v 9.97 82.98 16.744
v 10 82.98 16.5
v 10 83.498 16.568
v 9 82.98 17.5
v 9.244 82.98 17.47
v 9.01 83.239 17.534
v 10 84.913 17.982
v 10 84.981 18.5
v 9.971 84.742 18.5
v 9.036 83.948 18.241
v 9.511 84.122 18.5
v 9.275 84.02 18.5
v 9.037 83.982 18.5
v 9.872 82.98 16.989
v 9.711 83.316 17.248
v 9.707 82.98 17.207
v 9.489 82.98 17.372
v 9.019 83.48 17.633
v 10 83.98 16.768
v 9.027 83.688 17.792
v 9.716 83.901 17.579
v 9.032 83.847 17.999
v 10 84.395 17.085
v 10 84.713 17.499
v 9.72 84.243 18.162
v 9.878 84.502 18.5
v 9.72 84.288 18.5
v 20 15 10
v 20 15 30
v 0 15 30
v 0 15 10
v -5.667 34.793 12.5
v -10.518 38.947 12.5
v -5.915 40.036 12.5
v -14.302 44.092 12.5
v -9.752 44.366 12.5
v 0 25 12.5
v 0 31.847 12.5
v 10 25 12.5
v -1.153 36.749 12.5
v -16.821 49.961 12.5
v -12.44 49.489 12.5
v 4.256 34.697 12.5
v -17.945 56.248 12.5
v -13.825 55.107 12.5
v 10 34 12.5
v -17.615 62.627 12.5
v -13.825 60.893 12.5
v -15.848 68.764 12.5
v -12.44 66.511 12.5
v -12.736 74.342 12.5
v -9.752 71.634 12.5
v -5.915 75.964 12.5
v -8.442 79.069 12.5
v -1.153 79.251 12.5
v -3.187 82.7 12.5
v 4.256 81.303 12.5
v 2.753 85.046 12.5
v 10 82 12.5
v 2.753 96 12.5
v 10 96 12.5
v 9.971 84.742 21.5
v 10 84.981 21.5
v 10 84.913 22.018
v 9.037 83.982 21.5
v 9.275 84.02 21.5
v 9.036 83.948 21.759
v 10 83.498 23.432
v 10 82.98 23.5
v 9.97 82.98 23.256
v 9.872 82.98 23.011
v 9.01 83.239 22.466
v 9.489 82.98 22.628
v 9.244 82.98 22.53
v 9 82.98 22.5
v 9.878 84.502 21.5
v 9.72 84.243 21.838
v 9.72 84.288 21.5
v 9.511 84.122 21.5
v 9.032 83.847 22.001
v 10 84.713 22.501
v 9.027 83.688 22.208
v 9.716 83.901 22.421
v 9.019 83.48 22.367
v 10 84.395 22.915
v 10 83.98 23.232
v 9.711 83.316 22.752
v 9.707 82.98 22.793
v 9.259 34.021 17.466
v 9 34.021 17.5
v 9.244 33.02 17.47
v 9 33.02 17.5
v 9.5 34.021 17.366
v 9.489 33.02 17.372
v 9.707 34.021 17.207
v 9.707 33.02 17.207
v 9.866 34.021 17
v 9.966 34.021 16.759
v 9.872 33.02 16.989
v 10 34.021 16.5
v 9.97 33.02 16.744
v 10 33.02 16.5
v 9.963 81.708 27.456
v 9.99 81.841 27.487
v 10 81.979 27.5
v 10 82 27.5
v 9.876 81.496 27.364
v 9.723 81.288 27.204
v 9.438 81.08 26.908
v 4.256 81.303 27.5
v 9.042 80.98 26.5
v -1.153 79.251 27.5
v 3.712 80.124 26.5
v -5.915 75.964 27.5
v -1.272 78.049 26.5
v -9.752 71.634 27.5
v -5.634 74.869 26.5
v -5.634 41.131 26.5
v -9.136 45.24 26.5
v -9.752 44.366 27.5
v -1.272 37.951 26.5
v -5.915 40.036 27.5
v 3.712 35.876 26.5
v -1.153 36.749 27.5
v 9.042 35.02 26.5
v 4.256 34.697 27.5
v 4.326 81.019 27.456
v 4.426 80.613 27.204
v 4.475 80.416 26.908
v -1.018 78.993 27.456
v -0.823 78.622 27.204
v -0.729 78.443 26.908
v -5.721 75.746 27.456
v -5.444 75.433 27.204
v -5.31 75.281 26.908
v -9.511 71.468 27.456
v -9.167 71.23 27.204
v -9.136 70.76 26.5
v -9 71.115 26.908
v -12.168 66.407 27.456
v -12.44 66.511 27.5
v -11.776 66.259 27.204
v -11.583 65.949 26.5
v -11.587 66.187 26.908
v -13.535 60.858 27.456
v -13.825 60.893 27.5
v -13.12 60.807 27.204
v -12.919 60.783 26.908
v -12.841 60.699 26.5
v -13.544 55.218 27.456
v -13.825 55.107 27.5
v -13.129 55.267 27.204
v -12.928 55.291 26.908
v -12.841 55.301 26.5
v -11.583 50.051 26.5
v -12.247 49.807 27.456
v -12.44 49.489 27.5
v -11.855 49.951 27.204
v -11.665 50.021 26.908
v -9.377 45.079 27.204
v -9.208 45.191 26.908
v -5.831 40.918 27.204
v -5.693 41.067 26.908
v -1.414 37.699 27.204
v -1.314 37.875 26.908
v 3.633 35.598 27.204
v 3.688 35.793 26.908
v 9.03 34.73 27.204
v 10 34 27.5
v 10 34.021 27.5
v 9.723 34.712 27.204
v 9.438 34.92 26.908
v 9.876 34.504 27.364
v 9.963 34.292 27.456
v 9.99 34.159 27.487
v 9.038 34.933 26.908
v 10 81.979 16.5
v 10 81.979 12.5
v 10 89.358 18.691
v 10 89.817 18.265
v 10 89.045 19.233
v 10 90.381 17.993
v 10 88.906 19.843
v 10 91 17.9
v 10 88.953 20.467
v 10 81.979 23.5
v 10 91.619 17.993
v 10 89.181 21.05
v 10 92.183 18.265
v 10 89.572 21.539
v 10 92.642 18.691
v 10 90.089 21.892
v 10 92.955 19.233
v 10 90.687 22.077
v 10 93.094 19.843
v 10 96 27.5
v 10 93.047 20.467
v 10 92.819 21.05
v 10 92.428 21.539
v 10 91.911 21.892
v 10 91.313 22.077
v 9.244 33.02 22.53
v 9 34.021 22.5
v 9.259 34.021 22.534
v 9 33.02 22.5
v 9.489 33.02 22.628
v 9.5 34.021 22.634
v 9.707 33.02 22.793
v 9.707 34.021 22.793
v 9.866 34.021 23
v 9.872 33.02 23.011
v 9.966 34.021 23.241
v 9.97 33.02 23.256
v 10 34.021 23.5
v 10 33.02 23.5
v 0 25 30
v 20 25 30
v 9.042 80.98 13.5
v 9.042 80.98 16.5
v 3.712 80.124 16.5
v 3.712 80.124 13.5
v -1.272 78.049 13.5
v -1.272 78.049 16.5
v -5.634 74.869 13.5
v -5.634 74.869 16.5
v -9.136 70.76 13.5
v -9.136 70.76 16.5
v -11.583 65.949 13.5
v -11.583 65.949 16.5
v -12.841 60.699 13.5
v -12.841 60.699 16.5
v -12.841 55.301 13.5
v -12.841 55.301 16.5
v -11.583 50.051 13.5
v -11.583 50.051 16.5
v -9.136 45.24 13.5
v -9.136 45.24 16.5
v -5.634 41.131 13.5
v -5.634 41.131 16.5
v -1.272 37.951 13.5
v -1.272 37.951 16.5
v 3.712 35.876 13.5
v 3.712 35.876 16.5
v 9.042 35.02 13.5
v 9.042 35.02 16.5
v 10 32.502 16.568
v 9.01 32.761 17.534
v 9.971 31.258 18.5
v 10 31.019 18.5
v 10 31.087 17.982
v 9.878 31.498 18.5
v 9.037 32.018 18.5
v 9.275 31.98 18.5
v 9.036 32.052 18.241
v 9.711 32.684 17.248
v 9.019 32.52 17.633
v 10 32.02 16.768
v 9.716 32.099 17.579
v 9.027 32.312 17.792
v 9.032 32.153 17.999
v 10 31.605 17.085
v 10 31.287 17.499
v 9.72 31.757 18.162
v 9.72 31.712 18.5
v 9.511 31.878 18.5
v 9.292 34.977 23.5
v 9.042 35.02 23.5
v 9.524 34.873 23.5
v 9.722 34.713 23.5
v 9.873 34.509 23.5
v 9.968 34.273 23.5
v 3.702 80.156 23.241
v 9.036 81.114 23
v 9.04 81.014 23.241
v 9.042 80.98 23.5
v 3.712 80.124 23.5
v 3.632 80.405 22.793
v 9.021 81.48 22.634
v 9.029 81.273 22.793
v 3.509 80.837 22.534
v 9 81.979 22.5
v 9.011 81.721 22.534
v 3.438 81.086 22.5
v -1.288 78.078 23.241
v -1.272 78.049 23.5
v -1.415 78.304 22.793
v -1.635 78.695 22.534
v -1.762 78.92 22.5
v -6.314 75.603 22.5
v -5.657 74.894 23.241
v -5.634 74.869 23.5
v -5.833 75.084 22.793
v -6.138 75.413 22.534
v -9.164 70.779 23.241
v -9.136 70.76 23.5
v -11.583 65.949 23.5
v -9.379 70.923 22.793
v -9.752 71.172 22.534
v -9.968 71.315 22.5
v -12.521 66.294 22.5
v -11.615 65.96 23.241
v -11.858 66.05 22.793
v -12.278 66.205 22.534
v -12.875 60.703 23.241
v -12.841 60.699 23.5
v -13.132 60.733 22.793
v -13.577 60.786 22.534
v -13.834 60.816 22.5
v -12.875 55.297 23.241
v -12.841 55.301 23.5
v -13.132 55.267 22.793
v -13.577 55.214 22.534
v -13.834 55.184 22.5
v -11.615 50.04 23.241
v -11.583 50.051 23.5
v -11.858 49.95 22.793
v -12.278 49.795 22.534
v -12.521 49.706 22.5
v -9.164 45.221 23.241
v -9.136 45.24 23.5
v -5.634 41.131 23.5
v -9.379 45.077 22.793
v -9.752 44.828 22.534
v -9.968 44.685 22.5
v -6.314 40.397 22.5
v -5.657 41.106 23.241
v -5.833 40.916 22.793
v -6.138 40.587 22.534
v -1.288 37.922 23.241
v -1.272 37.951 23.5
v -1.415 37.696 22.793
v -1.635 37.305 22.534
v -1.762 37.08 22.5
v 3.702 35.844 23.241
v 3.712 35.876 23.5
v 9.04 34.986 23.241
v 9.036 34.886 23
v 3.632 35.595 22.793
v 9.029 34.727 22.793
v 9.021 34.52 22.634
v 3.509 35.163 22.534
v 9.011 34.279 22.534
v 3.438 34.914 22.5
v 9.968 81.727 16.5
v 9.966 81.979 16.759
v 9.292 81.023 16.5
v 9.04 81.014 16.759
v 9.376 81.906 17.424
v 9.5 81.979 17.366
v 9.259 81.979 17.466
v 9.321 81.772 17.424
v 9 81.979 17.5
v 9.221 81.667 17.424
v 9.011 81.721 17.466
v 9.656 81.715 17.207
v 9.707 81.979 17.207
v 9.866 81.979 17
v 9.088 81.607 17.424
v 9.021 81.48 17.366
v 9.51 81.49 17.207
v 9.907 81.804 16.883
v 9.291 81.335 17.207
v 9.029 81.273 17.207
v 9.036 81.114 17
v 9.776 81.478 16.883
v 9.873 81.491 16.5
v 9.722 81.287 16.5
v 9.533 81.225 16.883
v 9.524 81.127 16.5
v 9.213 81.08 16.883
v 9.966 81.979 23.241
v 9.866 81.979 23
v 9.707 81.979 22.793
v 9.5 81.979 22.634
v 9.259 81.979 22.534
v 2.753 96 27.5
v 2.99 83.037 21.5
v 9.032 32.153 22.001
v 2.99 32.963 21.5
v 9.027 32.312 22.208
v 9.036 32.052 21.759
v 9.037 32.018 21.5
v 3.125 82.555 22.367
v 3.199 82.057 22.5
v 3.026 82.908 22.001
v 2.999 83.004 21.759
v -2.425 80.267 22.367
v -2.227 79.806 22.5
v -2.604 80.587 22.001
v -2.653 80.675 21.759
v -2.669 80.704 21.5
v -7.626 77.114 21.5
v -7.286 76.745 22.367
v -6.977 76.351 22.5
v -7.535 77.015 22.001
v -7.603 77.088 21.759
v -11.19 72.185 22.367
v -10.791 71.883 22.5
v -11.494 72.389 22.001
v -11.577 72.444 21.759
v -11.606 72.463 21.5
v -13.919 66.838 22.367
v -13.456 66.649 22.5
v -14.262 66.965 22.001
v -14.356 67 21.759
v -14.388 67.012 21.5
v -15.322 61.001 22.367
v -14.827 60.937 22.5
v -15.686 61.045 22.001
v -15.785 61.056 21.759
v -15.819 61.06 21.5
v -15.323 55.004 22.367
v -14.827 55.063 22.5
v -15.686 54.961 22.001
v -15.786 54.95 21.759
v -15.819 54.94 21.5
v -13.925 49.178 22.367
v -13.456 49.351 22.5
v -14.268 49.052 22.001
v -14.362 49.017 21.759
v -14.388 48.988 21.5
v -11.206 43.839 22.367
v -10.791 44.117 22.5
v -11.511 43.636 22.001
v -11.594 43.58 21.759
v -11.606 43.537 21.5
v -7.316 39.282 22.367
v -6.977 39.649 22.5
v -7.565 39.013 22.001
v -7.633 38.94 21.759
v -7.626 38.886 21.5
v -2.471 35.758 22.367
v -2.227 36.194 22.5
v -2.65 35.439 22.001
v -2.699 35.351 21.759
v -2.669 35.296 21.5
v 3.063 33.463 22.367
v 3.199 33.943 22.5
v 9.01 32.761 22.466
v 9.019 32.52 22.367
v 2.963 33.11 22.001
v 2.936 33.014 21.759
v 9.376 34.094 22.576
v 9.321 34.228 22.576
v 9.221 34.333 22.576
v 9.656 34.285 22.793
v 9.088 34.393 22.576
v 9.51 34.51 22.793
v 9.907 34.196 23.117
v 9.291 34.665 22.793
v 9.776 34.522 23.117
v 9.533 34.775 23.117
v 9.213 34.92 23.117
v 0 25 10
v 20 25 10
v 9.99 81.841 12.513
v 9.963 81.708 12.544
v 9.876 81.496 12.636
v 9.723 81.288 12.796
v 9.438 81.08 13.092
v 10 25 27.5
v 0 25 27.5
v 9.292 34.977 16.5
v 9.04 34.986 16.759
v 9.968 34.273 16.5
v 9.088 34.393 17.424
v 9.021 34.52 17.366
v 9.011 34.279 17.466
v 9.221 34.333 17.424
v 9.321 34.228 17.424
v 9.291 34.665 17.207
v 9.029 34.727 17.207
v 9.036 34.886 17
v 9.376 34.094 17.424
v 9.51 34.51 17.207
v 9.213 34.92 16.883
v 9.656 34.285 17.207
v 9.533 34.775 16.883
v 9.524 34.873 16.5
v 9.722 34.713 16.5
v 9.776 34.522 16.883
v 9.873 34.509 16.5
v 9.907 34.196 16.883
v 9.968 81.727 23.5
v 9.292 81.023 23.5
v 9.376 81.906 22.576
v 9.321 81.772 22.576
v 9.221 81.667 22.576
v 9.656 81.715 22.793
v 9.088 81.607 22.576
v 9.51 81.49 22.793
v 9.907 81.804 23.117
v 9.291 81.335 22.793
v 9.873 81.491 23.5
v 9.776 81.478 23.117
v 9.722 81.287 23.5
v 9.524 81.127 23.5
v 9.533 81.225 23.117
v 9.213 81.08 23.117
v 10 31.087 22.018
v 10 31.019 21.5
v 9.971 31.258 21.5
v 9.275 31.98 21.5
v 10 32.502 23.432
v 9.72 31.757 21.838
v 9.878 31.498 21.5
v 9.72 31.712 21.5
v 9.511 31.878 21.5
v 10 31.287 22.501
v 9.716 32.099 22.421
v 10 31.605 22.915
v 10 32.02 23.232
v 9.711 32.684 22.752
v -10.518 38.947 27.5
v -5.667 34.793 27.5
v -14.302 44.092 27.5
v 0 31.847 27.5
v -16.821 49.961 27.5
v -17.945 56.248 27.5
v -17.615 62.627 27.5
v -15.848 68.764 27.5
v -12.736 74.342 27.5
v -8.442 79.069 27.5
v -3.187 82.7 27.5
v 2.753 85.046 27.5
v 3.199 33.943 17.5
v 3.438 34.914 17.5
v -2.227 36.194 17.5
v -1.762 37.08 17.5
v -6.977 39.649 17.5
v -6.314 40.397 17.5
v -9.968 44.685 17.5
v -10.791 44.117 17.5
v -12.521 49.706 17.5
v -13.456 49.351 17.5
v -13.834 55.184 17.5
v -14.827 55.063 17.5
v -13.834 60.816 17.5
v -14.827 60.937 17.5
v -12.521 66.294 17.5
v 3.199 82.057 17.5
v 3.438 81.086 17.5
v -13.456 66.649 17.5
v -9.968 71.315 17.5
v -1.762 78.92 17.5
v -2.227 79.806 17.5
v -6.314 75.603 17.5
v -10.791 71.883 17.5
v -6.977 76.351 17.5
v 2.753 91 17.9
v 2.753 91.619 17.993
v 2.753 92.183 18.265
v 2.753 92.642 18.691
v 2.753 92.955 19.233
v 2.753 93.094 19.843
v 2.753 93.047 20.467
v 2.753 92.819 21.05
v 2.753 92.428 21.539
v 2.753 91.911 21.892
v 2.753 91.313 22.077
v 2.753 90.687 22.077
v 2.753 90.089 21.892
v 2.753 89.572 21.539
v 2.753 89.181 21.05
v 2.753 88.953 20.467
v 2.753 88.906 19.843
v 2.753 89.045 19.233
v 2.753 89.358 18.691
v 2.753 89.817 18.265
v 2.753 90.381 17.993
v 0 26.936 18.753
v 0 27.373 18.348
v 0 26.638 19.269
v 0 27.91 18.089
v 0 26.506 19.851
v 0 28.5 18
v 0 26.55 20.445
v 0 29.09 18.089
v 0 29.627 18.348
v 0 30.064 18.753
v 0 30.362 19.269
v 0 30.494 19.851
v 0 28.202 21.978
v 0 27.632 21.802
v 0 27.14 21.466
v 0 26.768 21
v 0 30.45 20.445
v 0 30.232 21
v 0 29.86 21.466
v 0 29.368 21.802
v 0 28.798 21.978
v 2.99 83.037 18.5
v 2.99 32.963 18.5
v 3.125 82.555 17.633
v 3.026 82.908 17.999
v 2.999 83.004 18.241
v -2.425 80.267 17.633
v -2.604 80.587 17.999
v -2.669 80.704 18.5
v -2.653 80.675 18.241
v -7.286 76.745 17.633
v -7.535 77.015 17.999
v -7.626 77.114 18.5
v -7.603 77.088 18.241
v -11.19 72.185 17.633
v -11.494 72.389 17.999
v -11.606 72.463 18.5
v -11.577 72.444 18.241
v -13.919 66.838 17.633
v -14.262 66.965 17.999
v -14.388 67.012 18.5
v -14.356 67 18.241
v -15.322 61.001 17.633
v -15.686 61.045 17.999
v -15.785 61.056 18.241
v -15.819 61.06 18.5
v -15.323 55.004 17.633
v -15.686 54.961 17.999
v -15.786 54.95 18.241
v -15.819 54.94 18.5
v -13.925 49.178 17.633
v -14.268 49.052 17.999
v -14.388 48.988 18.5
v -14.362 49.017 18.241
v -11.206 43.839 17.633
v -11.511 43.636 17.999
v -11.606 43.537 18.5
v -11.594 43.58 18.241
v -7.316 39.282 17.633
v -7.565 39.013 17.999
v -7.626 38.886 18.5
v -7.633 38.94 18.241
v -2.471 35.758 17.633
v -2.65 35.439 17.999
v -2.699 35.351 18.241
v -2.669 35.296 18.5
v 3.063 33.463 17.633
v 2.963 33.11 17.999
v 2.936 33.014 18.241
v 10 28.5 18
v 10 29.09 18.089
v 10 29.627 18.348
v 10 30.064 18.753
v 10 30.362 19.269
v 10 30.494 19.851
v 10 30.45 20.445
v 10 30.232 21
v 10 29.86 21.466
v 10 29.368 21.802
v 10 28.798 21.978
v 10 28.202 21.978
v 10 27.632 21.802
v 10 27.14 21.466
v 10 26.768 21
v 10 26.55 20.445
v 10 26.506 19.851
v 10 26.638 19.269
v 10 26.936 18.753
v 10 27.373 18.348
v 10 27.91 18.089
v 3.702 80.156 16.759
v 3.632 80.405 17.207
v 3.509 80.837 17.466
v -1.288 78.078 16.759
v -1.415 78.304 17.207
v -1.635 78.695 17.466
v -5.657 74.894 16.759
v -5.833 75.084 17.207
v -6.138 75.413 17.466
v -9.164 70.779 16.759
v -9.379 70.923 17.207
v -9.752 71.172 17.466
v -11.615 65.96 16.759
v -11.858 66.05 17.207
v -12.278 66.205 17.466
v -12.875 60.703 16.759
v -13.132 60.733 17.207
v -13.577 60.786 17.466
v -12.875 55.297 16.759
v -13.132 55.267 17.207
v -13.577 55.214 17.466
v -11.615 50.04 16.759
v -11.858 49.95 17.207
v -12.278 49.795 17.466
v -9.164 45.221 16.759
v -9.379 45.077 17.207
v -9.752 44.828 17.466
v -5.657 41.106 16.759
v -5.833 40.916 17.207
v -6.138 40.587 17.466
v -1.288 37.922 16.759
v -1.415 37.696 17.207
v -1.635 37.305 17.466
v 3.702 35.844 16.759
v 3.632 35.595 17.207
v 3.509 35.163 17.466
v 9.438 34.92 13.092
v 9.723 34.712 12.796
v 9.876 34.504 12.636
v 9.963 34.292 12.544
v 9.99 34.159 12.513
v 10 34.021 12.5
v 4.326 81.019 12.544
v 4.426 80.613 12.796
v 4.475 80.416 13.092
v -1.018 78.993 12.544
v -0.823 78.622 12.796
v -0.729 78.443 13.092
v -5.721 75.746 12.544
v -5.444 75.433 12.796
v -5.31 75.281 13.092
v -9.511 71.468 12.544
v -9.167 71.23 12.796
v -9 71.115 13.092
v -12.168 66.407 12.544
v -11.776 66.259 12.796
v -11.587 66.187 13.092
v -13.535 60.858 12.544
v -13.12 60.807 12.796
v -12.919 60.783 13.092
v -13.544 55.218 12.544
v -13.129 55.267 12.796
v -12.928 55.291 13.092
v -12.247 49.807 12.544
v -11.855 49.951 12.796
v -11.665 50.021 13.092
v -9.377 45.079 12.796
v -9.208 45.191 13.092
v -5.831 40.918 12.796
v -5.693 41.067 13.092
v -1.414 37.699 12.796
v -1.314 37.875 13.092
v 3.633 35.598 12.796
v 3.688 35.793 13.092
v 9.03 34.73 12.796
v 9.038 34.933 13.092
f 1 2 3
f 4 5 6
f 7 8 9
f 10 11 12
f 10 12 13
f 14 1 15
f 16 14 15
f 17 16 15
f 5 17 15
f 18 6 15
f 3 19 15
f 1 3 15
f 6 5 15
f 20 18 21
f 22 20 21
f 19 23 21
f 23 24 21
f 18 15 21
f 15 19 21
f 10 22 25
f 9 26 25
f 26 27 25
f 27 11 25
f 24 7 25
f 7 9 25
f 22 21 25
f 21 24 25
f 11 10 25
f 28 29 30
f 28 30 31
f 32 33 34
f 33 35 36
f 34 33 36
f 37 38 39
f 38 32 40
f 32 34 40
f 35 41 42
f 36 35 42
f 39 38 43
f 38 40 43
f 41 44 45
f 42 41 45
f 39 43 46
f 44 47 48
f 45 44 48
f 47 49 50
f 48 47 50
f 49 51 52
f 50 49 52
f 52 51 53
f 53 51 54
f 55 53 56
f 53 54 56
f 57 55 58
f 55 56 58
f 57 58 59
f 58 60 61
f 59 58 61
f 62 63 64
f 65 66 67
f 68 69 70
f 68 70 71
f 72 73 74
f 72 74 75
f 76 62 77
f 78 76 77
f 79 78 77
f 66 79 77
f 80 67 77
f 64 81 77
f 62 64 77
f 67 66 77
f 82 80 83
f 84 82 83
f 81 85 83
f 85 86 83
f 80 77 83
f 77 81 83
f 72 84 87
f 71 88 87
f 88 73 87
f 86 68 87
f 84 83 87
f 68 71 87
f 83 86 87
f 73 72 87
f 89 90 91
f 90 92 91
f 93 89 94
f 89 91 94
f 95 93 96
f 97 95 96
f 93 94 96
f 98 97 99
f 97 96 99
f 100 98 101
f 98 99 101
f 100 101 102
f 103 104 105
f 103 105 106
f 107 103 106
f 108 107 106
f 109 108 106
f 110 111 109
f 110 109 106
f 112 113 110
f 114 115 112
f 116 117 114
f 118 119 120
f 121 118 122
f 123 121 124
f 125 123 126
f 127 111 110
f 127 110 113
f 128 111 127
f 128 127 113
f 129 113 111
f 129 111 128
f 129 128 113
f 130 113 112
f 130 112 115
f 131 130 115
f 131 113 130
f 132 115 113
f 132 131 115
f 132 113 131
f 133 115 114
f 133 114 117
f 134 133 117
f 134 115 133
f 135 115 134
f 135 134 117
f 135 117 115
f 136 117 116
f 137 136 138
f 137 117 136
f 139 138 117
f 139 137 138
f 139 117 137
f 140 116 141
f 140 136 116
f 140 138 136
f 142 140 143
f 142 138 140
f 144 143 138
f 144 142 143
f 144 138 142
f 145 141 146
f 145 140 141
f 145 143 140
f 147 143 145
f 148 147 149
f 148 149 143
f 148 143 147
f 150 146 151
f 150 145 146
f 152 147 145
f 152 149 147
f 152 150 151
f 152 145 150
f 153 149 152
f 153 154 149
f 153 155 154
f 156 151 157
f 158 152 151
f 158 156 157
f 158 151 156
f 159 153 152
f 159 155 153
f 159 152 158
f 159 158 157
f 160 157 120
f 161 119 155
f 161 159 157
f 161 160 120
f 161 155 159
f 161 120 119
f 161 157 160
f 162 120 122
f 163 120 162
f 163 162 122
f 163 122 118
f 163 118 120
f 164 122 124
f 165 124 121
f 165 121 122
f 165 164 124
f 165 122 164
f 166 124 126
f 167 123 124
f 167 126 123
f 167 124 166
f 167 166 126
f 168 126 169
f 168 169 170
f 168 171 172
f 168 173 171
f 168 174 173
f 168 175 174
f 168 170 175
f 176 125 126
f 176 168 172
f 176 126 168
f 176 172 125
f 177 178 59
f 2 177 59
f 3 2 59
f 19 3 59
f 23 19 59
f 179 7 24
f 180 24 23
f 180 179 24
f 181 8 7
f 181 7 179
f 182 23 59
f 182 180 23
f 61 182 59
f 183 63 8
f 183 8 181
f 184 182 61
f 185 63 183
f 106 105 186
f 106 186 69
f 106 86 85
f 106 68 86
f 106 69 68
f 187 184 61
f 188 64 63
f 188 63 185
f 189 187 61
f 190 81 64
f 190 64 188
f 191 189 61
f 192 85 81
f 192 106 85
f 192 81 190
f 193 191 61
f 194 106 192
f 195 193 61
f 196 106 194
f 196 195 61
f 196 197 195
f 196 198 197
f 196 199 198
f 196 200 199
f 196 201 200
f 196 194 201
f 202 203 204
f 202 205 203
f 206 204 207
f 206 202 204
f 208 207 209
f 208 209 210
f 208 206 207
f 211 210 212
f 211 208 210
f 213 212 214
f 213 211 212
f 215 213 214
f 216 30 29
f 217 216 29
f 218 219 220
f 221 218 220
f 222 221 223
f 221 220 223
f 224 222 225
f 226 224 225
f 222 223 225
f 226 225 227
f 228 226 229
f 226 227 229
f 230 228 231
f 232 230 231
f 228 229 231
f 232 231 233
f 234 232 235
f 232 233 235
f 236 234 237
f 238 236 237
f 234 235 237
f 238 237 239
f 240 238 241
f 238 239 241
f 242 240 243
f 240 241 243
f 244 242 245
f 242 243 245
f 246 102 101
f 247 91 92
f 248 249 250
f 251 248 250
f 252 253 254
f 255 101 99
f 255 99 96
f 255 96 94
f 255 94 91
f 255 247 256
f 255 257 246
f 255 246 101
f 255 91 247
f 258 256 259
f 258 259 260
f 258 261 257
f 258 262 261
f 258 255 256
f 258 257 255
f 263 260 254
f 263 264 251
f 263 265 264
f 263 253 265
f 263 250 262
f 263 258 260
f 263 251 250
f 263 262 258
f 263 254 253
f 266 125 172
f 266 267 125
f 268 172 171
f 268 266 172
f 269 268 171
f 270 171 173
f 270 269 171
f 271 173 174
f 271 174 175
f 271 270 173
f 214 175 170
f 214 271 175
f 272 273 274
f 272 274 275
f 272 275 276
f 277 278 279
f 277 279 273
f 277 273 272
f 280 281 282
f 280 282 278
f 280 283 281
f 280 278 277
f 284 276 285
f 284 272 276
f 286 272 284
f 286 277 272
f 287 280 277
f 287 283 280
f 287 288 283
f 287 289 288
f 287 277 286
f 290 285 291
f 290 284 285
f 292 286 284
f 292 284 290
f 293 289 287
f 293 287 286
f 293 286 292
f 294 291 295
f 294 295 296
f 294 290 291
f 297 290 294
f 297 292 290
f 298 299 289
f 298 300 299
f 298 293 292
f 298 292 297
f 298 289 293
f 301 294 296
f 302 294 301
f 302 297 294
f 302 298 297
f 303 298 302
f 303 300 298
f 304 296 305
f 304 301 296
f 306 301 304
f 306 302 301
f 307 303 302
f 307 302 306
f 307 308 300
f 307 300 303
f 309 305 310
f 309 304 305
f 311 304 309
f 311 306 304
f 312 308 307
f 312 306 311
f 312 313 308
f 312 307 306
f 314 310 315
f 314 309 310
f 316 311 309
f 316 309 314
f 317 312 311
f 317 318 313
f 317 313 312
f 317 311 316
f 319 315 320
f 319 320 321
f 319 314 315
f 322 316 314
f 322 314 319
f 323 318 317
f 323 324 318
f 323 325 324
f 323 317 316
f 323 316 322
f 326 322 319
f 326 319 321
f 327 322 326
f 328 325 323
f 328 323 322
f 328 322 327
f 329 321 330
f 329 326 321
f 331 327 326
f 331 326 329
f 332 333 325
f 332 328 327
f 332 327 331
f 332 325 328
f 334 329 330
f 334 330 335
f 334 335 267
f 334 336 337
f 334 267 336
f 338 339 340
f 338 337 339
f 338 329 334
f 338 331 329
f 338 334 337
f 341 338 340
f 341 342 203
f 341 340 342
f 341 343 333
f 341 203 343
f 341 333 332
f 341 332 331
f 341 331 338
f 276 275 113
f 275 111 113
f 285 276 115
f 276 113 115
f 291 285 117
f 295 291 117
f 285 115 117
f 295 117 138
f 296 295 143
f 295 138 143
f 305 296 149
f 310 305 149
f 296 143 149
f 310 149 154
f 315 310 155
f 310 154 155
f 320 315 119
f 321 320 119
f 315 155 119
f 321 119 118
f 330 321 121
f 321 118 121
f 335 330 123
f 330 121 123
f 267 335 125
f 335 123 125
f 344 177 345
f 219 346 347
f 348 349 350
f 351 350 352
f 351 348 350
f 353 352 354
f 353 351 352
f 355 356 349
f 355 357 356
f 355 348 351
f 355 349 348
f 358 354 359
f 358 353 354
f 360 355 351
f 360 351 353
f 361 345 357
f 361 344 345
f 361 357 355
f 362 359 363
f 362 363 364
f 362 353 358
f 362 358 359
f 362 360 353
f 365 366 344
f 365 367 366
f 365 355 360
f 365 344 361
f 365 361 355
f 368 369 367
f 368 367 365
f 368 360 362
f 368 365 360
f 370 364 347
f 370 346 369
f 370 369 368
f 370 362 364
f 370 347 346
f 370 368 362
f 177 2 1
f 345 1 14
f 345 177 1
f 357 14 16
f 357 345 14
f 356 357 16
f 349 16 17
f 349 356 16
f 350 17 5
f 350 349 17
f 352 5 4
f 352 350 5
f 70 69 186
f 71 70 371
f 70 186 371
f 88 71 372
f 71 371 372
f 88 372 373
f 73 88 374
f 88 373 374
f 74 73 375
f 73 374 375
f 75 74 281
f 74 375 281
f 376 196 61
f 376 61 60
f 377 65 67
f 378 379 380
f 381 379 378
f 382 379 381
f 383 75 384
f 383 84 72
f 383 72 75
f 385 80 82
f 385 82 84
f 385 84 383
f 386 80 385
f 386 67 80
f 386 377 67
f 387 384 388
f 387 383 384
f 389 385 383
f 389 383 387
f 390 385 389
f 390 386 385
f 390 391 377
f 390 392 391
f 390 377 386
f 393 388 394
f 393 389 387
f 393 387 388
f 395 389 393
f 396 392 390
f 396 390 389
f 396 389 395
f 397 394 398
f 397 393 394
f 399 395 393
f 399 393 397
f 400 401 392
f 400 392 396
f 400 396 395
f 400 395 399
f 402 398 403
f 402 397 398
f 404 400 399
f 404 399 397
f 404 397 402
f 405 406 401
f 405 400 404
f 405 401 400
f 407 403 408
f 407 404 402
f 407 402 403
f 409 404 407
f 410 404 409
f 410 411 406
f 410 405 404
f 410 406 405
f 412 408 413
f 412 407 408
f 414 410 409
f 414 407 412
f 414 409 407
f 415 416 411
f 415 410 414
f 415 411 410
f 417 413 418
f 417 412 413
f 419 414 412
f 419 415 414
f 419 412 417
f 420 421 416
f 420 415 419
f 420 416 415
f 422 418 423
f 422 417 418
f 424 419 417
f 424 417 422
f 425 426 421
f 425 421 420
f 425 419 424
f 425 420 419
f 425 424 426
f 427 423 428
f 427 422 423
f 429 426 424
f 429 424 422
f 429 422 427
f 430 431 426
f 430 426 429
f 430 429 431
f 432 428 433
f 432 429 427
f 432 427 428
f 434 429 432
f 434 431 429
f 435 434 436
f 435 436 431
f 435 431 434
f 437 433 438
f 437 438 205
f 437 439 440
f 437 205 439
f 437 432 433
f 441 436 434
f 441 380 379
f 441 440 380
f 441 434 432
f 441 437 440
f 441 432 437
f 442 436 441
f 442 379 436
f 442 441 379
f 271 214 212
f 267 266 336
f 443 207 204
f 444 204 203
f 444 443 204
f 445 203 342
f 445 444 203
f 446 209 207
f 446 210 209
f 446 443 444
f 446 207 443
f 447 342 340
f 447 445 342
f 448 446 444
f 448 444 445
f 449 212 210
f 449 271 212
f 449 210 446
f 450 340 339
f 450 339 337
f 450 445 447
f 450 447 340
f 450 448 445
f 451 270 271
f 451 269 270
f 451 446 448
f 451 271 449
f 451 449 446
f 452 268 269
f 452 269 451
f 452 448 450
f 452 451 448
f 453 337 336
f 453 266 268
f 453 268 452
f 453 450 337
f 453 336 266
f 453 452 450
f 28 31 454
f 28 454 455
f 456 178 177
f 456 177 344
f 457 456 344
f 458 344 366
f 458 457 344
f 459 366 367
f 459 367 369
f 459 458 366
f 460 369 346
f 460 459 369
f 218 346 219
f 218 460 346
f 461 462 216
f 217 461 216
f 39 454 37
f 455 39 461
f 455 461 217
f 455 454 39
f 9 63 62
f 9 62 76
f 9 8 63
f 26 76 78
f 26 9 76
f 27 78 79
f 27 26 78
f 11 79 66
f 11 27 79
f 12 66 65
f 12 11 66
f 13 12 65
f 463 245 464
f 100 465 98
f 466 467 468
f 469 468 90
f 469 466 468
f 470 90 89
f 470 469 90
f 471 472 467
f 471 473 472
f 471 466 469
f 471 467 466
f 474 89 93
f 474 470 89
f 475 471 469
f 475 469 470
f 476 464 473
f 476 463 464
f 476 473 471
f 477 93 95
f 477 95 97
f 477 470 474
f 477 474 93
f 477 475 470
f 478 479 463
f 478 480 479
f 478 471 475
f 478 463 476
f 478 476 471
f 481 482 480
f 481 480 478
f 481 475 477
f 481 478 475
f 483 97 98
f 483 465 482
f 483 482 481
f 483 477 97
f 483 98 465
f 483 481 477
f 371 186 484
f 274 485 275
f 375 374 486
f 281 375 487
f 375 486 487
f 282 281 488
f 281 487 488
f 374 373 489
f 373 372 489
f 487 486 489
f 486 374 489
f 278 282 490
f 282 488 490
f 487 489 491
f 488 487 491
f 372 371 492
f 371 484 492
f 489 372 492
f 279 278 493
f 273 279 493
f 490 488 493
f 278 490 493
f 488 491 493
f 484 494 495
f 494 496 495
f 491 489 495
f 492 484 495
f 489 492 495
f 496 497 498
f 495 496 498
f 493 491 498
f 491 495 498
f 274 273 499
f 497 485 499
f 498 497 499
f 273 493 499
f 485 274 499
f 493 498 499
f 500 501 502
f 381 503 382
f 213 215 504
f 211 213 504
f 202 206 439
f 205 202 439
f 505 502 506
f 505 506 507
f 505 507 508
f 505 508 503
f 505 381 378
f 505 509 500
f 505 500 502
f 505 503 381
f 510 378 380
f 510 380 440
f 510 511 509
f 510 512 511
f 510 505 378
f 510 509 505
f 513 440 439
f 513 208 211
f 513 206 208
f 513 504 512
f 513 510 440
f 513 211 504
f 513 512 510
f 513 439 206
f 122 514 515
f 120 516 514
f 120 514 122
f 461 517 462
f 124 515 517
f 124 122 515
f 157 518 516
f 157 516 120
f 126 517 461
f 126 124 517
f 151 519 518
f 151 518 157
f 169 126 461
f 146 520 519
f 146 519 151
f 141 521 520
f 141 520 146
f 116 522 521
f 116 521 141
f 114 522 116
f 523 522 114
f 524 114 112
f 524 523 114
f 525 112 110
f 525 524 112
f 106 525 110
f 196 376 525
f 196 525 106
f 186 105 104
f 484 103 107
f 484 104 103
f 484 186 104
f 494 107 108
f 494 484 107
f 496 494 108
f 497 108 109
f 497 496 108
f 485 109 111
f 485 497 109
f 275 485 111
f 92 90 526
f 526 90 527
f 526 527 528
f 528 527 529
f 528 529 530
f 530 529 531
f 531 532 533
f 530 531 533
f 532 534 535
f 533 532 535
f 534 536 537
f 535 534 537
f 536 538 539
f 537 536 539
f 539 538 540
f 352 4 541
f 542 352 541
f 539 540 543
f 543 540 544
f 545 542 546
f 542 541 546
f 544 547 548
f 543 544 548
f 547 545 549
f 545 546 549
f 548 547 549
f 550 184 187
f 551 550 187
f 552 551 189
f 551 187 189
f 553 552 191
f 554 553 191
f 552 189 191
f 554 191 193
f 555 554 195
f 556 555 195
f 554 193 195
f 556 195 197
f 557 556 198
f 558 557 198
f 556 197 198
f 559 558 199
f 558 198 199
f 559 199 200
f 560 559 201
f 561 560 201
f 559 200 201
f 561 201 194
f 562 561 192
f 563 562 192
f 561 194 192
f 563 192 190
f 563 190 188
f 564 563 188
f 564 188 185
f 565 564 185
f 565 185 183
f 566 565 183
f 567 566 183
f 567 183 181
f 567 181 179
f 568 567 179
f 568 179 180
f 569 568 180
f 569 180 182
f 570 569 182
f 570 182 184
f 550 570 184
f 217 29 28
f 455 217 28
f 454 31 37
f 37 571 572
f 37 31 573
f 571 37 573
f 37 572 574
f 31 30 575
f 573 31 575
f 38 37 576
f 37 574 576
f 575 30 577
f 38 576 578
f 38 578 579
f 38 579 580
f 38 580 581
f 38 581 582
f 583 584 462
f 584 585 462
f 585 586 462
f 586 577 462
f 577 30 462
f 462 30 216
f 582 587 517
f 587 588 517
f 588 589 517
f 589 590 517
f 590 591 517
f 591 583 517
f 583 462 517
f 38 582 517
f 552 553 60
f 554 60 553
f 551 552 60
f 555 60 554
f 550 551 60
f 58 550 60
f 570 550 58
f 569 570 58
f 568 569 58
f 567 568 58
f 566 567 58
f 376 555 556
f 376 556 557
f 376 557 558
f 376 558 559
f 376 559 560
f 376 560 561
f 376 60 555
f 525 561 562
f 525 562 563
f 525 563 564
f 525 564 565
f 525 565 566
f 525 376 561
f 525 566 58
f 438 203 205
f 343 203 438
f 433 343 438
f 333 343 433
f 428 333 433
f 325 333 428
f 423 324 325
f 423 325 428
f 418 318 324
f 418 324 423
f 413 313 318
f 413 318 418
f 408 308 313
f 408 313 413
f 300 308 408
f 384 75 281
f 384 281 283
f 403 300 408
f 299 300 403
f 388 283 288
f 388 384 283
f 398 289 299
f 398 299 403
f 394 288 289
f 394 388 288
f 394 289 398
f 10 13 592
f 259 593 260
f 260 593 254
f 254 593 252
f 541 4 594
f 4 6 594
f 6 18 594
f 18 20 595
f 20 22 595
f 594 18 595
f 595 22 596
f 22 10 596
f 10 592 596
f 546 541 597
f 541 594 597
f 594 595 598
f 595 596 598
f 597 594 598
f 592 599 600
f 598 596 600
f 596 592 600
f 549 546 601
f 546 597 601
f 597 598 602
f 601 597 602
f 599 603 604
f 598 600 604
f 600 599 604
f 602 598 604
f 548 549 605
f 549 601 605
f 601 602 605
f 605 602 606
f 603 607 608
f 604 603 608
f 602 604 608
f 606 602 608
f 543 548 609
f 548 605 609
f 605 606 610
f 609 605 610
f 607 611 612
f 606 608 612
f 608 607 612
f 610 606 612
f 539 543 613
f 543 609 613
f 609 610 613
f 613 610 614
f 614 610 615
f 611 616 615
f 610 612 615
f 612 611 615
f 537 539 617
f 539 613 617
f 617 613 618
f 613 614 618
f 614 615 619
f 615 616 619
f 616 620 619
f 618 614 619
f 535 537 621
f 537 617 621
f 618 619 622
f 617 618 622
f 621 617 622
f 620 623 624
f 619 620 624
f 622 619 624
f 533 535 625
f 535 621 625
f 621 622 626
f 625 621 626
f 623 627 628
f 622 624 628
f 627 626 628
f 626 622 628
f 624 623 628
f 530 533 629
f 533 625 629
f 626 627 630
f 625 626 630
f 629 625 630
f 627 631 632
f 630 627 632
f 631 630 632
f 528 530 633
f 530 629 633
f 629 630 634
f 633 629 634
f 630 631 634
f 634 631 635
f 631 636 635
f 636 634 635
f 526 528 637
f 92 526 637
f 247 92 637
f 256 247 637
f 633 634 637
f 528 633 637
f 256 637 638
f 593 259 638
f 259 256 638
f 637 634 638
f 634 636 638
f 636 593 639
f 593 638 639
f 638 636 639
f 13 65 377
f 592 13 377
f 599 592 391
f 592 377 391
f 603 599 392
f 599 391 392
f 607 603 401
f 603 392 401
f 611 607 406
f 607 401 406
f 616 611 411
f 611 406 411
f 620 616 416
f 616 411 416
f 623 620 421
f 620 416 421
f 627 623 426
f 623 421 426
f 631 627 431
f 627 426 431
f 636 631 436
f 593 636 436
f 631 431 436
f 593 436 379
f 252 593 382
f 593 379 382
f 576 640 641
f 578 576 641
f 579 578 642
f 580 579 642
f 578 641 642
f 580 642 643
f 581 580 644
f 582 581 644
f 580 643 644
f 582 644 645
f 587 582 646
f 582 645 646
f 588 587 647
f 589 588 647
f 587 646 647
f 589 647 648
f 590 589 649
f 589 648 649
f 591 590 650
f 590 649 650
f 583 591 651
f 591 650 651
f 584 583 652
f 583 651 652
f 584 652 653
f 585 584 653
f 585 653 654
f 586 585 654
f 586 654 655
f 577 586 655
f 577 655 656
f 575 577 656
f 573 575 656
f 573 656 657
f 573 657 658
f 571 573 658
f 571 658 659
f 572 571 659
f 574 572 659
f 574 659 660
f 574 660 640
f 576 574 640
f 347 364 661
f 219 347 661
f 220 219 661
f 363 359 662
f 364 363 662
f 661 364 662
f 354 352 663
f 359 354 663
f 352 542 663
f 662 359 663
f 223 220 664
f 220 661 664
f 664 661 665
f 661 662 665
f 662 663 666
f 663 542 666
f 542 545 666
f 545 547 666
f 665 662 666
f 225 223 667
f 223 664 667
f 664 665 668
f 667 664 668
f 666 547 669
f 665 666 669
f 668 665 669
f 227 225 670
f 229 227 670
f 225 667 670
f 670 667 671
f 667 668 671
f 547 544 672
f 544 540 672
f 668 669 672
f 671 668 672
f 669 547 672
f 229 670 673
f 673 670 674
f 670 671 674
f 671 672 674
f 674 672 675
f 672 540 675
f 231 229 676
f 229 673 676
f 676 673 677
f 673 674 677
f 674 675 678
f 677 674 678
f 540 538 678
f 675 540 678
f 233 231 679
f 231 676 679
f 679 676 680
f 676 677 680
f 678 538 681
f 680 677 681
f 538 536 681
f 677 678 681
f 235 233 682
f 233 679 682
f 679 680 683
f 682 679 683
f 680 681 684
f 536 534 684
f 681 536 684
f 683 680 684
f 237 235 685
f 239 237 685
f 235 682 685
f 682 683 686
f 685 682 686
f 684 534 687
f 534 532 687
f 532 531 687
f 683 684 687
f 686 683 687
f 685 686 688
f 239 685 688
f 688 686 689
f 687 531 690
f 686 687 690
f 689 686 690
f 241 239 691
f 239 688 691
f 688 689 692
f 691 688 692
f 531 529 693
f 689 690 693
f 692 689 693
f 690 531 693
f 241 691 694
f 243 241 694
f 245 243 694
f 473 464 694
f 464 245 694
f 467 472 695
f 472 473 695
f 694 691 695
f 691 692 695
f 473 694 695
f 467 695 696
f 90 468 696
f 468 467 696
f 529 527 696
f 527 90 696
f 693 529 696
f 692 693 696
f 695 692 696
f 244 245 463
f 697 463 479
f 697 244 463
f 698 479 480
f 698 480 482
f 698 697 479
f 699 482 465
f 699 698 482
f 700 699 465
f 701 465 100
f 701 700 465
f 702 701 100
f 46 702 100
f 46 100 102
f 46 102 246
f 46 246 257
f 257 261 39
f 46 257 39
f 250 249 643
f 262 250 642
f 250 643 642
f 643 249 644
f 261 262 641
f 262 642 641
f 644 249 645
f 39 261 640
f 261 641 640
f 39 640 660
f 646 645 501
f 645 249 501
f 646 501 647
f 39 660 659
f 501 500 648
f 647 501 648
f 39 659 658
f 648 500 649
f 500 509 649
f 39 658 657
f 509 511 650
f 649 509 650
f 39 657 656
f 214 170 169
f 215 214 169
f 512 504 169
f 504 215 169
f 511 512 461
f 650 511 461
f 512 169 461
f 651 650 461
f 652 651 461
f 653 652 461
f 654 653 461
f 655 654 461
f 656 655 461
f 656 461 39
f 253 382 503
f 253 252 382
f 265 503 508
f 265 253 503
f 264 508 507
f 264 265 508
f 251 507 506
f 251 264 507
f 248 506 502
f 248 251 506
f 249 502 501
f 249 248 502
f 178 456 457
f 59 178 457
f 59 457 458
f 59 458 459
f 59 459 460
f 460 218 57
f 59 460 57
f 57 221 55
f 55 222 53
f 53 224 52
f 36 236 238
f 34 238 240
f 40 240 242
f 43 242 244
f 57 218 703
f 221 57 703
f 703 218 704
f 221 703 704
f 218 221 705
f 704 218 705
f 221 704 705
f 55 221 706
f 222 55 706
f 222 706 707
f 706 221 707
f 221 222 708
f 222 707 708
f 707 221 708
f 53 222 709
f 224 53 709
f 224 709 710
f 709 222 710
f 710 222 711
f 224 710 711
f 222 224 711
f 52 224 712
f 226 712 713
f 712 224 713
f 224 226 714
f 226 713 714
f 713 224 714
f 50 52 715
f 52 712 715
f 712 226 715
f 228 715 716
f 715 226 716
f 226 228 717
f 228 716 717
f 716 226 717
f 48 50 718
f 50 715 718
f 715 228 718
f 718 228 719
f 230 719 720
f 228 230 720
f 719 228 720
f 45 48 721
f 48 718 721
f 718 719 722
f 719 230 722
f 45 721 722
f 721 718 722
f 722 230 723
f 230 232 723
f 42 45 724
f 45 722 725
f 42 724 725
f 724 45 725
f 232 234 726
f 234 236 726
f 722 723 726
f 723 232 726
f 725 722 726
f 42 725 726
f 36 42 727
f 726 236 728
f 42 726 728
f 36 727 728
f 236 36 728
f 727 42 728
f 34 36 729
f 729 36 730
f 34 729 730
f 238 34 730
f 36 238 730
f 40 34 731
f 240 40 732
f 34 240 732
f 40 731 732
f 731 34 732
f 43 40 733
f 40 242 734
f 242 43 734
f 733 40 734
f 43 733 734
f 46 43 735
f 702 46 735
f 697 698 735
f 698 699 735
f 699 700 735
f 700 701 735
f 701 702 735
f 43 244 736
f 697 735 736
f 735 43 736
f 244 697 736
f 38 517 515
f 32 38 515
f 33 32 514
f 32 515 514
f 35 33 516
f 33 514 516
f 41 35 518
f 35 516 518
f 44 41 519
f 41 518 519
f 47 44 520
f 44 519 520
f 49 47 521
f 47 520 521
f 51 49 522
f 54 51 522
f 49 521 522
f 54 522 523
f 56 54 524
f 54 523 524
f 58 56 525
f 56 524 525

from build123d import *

# Parameters (mm, degrees)
SKETCH1_W           = 20
SKETCH1_H           = 40
BOSS_EXTRUDE1_DEPTH = 15
SKETCH2_W           = 20
SKETCH2_H           = 20
BOSS_EXTRUDE2_DEPTH = 10
BOSS_EXTRUDE3_DEPTH = 5
BOSS_EXTRUDE4_DEPTH = 5
BOSS_EXTRUDE5_DEPTH = 5
BOSS_EXTRUDE6_DEPTH = 15
SKETCH7_R           = 2.1
SKETCH7_R_2         = 2
CUT_EXTRUDE1_DEPTH  = 108.703296143
FILLET5_R           = 1
SKETCH9_W           = 40
SKETCH9_H           = 15
CUT_EXTRUDE2_DEPTH  = 20


with BuildPart() as part:
    # Sketch1 → Boss-Extrude1 (new body)
    with BuildSketch(Plane(origin=(0, 0, 0), x_dir=(1, 0, 0), z_dir=(0, 1, 0))):
        with Locations((10, -20)):
            Rectangle(SKETCH1_W, SKETCH1_H)
    extrude(amount=BOSS_EXTRUDE1_DEPTH)

    # Sketch2 → Boss-Extrude2 (add)
    with BuildSketch(Plane(origin=(0, 15, 0), x_dir=(1, 0, 0), z_dir=(0, 1, 0))):
        with Locations((10, -20)):
            Rectangle(SKETCH2_W, SKETCH2_H)
    extrude(amount=BOSS_EXTRUDE2_DEPTH)

    # Sketch3 → Boss-Extrude3 (add)
    with BuildSketch(Plane.XY.offset(27.5)):
        with BuildLine():
            Line((10, 35), (10, 25))
            Line((10, 25), (0, 25))
            Line((0, 25), (0, 31.846606339))
            ThreePointArc((0, 31.846606339), (-17.534478591, 63.08453427), (10, 86))
            Line((10, 86), (10, 81))
            ThreePointArc((10, 81), (-13, 58), (10, 35))
        make_face()
    extrude(amount=-BOSS_EXTRUDE3_DEPTH)

    # Sketch4 → Boss-Extrude4 (add)
    with BuildSketch(Plane(origin=(0, 0, 22.5), x_dir=(-1, 0, 0), z_dir=(0, 0, -1))):
        with BuildLine():
            Line((-10, 86), (-10, 84))
            ThreePointArc((-10, 84), (16, 58), (-10, 32))
            Line((-10, 32), (-10, 30))
            Line((-10, 30), (-10, 25))
            Line((-10, 25), (0, 25))
            Line((0, 25), (0, 31.846606339))
            ThreePointArc((0, 31.846606339), (17.534478591, 63.08453427), (-10, 86))
        make_face()
    extrude(amount=BOSS_EXTRUDE4_DEPTH)

    # Sketch5 → Boss-Extrude5 (add)
    with BuildSketch(Plane(origin=(0, 0, 17.5), x_dir=(-1, 0, 0), z_dir=(0, 0, -1))):
        with BuildLine():
            Line((-10, 86), (-10, 81))
            ThreePointArc((-10, 81), (13, 58), (-10, 35))
            Line((-10, 35), (-10, 30))
            Line((-10, 30), (-10, 25))
            Line((-10, 25), (0, 25))
            Line((0, 25), (0, 31.846606339))
            ThreePointArc((0, 31.846606339), (17.534478591, 63.08453427), (-10, 86))
        make_face()
    extrude(amount=BOSS_EXTRUDE5_DEPTH)

    # Sketch6 → Boss-Extrude6 (add)
    with BuildSketch(Plane.XY.offset(27.5)):
        with BuildLine():
            Line((10, 86), (10, 96))
            Line((10, 96), (2.753066737, 96))
            Line((2.753066737, 96), (2.753066737, 85.045923136))
            ThreePointArc((2.753066737, 85.045923136), (6.345266618, 85.760456118), (10, 86))
        make_face()
    extrude(amount=-BOSS_EXTRUDE6_DEPTH)

    # Sketch7 → Cut-Extrude1 (cut, through all)
    with BuildSketch(Plane(origin=(10, 0, 0), x_dir=(0, 0, -1), z_dir=(1, 0, 0))):
        with Locations((-20, 91)):
            Circle(SKETCH7_R)
        with Locations((-20, 28.5)):
            Circle(SKETCH7_R_2)
    extrude(amount=-CUT_EXTRUDE1_DEPTH, mode=Mode.SUBTRACT)

    # Fillet5
    fillet5_edges = [part.edges().sort_by_distance(p)[0] for p in [
        (10, 82.5, 22.5),
        (-13, 58, 22.5),
        (10, 81, 25),
        (10, 35, 25),
        (-13, 58, 27.5),
        (10, 33.5, 22.5),
        (-16, 58, 22.5),
        (10, 84, 20),
        (10, 32, 20),
        (-16, 58, 17.5),
        (10, 82.5, 17.5),
        (-13, 58, 17.5),
        (10, 81, 15),
        (10, 33.5, 17.5),
        (10, 35, 15),
        (-13, 58, 12.5),
    ]]
    fillet(fillet5_edges, radius=FILLET5_R)

    # Sketch9 → Cut-Extrude2 (cut)
    with BuildSketch(Plane(origin=(20, 0, 0), x_dir=(0, 0, -1), z_dir=(1, 0, 0))):
        with Locations((-20, 7.5)):
            Rectangle(SKETCH9_W, SKETCH9_H)
    extrude(amount=-CUT_EXTRUDE2_DEPTH, mode=Mode.SUBTRACT)


solid = part.part
